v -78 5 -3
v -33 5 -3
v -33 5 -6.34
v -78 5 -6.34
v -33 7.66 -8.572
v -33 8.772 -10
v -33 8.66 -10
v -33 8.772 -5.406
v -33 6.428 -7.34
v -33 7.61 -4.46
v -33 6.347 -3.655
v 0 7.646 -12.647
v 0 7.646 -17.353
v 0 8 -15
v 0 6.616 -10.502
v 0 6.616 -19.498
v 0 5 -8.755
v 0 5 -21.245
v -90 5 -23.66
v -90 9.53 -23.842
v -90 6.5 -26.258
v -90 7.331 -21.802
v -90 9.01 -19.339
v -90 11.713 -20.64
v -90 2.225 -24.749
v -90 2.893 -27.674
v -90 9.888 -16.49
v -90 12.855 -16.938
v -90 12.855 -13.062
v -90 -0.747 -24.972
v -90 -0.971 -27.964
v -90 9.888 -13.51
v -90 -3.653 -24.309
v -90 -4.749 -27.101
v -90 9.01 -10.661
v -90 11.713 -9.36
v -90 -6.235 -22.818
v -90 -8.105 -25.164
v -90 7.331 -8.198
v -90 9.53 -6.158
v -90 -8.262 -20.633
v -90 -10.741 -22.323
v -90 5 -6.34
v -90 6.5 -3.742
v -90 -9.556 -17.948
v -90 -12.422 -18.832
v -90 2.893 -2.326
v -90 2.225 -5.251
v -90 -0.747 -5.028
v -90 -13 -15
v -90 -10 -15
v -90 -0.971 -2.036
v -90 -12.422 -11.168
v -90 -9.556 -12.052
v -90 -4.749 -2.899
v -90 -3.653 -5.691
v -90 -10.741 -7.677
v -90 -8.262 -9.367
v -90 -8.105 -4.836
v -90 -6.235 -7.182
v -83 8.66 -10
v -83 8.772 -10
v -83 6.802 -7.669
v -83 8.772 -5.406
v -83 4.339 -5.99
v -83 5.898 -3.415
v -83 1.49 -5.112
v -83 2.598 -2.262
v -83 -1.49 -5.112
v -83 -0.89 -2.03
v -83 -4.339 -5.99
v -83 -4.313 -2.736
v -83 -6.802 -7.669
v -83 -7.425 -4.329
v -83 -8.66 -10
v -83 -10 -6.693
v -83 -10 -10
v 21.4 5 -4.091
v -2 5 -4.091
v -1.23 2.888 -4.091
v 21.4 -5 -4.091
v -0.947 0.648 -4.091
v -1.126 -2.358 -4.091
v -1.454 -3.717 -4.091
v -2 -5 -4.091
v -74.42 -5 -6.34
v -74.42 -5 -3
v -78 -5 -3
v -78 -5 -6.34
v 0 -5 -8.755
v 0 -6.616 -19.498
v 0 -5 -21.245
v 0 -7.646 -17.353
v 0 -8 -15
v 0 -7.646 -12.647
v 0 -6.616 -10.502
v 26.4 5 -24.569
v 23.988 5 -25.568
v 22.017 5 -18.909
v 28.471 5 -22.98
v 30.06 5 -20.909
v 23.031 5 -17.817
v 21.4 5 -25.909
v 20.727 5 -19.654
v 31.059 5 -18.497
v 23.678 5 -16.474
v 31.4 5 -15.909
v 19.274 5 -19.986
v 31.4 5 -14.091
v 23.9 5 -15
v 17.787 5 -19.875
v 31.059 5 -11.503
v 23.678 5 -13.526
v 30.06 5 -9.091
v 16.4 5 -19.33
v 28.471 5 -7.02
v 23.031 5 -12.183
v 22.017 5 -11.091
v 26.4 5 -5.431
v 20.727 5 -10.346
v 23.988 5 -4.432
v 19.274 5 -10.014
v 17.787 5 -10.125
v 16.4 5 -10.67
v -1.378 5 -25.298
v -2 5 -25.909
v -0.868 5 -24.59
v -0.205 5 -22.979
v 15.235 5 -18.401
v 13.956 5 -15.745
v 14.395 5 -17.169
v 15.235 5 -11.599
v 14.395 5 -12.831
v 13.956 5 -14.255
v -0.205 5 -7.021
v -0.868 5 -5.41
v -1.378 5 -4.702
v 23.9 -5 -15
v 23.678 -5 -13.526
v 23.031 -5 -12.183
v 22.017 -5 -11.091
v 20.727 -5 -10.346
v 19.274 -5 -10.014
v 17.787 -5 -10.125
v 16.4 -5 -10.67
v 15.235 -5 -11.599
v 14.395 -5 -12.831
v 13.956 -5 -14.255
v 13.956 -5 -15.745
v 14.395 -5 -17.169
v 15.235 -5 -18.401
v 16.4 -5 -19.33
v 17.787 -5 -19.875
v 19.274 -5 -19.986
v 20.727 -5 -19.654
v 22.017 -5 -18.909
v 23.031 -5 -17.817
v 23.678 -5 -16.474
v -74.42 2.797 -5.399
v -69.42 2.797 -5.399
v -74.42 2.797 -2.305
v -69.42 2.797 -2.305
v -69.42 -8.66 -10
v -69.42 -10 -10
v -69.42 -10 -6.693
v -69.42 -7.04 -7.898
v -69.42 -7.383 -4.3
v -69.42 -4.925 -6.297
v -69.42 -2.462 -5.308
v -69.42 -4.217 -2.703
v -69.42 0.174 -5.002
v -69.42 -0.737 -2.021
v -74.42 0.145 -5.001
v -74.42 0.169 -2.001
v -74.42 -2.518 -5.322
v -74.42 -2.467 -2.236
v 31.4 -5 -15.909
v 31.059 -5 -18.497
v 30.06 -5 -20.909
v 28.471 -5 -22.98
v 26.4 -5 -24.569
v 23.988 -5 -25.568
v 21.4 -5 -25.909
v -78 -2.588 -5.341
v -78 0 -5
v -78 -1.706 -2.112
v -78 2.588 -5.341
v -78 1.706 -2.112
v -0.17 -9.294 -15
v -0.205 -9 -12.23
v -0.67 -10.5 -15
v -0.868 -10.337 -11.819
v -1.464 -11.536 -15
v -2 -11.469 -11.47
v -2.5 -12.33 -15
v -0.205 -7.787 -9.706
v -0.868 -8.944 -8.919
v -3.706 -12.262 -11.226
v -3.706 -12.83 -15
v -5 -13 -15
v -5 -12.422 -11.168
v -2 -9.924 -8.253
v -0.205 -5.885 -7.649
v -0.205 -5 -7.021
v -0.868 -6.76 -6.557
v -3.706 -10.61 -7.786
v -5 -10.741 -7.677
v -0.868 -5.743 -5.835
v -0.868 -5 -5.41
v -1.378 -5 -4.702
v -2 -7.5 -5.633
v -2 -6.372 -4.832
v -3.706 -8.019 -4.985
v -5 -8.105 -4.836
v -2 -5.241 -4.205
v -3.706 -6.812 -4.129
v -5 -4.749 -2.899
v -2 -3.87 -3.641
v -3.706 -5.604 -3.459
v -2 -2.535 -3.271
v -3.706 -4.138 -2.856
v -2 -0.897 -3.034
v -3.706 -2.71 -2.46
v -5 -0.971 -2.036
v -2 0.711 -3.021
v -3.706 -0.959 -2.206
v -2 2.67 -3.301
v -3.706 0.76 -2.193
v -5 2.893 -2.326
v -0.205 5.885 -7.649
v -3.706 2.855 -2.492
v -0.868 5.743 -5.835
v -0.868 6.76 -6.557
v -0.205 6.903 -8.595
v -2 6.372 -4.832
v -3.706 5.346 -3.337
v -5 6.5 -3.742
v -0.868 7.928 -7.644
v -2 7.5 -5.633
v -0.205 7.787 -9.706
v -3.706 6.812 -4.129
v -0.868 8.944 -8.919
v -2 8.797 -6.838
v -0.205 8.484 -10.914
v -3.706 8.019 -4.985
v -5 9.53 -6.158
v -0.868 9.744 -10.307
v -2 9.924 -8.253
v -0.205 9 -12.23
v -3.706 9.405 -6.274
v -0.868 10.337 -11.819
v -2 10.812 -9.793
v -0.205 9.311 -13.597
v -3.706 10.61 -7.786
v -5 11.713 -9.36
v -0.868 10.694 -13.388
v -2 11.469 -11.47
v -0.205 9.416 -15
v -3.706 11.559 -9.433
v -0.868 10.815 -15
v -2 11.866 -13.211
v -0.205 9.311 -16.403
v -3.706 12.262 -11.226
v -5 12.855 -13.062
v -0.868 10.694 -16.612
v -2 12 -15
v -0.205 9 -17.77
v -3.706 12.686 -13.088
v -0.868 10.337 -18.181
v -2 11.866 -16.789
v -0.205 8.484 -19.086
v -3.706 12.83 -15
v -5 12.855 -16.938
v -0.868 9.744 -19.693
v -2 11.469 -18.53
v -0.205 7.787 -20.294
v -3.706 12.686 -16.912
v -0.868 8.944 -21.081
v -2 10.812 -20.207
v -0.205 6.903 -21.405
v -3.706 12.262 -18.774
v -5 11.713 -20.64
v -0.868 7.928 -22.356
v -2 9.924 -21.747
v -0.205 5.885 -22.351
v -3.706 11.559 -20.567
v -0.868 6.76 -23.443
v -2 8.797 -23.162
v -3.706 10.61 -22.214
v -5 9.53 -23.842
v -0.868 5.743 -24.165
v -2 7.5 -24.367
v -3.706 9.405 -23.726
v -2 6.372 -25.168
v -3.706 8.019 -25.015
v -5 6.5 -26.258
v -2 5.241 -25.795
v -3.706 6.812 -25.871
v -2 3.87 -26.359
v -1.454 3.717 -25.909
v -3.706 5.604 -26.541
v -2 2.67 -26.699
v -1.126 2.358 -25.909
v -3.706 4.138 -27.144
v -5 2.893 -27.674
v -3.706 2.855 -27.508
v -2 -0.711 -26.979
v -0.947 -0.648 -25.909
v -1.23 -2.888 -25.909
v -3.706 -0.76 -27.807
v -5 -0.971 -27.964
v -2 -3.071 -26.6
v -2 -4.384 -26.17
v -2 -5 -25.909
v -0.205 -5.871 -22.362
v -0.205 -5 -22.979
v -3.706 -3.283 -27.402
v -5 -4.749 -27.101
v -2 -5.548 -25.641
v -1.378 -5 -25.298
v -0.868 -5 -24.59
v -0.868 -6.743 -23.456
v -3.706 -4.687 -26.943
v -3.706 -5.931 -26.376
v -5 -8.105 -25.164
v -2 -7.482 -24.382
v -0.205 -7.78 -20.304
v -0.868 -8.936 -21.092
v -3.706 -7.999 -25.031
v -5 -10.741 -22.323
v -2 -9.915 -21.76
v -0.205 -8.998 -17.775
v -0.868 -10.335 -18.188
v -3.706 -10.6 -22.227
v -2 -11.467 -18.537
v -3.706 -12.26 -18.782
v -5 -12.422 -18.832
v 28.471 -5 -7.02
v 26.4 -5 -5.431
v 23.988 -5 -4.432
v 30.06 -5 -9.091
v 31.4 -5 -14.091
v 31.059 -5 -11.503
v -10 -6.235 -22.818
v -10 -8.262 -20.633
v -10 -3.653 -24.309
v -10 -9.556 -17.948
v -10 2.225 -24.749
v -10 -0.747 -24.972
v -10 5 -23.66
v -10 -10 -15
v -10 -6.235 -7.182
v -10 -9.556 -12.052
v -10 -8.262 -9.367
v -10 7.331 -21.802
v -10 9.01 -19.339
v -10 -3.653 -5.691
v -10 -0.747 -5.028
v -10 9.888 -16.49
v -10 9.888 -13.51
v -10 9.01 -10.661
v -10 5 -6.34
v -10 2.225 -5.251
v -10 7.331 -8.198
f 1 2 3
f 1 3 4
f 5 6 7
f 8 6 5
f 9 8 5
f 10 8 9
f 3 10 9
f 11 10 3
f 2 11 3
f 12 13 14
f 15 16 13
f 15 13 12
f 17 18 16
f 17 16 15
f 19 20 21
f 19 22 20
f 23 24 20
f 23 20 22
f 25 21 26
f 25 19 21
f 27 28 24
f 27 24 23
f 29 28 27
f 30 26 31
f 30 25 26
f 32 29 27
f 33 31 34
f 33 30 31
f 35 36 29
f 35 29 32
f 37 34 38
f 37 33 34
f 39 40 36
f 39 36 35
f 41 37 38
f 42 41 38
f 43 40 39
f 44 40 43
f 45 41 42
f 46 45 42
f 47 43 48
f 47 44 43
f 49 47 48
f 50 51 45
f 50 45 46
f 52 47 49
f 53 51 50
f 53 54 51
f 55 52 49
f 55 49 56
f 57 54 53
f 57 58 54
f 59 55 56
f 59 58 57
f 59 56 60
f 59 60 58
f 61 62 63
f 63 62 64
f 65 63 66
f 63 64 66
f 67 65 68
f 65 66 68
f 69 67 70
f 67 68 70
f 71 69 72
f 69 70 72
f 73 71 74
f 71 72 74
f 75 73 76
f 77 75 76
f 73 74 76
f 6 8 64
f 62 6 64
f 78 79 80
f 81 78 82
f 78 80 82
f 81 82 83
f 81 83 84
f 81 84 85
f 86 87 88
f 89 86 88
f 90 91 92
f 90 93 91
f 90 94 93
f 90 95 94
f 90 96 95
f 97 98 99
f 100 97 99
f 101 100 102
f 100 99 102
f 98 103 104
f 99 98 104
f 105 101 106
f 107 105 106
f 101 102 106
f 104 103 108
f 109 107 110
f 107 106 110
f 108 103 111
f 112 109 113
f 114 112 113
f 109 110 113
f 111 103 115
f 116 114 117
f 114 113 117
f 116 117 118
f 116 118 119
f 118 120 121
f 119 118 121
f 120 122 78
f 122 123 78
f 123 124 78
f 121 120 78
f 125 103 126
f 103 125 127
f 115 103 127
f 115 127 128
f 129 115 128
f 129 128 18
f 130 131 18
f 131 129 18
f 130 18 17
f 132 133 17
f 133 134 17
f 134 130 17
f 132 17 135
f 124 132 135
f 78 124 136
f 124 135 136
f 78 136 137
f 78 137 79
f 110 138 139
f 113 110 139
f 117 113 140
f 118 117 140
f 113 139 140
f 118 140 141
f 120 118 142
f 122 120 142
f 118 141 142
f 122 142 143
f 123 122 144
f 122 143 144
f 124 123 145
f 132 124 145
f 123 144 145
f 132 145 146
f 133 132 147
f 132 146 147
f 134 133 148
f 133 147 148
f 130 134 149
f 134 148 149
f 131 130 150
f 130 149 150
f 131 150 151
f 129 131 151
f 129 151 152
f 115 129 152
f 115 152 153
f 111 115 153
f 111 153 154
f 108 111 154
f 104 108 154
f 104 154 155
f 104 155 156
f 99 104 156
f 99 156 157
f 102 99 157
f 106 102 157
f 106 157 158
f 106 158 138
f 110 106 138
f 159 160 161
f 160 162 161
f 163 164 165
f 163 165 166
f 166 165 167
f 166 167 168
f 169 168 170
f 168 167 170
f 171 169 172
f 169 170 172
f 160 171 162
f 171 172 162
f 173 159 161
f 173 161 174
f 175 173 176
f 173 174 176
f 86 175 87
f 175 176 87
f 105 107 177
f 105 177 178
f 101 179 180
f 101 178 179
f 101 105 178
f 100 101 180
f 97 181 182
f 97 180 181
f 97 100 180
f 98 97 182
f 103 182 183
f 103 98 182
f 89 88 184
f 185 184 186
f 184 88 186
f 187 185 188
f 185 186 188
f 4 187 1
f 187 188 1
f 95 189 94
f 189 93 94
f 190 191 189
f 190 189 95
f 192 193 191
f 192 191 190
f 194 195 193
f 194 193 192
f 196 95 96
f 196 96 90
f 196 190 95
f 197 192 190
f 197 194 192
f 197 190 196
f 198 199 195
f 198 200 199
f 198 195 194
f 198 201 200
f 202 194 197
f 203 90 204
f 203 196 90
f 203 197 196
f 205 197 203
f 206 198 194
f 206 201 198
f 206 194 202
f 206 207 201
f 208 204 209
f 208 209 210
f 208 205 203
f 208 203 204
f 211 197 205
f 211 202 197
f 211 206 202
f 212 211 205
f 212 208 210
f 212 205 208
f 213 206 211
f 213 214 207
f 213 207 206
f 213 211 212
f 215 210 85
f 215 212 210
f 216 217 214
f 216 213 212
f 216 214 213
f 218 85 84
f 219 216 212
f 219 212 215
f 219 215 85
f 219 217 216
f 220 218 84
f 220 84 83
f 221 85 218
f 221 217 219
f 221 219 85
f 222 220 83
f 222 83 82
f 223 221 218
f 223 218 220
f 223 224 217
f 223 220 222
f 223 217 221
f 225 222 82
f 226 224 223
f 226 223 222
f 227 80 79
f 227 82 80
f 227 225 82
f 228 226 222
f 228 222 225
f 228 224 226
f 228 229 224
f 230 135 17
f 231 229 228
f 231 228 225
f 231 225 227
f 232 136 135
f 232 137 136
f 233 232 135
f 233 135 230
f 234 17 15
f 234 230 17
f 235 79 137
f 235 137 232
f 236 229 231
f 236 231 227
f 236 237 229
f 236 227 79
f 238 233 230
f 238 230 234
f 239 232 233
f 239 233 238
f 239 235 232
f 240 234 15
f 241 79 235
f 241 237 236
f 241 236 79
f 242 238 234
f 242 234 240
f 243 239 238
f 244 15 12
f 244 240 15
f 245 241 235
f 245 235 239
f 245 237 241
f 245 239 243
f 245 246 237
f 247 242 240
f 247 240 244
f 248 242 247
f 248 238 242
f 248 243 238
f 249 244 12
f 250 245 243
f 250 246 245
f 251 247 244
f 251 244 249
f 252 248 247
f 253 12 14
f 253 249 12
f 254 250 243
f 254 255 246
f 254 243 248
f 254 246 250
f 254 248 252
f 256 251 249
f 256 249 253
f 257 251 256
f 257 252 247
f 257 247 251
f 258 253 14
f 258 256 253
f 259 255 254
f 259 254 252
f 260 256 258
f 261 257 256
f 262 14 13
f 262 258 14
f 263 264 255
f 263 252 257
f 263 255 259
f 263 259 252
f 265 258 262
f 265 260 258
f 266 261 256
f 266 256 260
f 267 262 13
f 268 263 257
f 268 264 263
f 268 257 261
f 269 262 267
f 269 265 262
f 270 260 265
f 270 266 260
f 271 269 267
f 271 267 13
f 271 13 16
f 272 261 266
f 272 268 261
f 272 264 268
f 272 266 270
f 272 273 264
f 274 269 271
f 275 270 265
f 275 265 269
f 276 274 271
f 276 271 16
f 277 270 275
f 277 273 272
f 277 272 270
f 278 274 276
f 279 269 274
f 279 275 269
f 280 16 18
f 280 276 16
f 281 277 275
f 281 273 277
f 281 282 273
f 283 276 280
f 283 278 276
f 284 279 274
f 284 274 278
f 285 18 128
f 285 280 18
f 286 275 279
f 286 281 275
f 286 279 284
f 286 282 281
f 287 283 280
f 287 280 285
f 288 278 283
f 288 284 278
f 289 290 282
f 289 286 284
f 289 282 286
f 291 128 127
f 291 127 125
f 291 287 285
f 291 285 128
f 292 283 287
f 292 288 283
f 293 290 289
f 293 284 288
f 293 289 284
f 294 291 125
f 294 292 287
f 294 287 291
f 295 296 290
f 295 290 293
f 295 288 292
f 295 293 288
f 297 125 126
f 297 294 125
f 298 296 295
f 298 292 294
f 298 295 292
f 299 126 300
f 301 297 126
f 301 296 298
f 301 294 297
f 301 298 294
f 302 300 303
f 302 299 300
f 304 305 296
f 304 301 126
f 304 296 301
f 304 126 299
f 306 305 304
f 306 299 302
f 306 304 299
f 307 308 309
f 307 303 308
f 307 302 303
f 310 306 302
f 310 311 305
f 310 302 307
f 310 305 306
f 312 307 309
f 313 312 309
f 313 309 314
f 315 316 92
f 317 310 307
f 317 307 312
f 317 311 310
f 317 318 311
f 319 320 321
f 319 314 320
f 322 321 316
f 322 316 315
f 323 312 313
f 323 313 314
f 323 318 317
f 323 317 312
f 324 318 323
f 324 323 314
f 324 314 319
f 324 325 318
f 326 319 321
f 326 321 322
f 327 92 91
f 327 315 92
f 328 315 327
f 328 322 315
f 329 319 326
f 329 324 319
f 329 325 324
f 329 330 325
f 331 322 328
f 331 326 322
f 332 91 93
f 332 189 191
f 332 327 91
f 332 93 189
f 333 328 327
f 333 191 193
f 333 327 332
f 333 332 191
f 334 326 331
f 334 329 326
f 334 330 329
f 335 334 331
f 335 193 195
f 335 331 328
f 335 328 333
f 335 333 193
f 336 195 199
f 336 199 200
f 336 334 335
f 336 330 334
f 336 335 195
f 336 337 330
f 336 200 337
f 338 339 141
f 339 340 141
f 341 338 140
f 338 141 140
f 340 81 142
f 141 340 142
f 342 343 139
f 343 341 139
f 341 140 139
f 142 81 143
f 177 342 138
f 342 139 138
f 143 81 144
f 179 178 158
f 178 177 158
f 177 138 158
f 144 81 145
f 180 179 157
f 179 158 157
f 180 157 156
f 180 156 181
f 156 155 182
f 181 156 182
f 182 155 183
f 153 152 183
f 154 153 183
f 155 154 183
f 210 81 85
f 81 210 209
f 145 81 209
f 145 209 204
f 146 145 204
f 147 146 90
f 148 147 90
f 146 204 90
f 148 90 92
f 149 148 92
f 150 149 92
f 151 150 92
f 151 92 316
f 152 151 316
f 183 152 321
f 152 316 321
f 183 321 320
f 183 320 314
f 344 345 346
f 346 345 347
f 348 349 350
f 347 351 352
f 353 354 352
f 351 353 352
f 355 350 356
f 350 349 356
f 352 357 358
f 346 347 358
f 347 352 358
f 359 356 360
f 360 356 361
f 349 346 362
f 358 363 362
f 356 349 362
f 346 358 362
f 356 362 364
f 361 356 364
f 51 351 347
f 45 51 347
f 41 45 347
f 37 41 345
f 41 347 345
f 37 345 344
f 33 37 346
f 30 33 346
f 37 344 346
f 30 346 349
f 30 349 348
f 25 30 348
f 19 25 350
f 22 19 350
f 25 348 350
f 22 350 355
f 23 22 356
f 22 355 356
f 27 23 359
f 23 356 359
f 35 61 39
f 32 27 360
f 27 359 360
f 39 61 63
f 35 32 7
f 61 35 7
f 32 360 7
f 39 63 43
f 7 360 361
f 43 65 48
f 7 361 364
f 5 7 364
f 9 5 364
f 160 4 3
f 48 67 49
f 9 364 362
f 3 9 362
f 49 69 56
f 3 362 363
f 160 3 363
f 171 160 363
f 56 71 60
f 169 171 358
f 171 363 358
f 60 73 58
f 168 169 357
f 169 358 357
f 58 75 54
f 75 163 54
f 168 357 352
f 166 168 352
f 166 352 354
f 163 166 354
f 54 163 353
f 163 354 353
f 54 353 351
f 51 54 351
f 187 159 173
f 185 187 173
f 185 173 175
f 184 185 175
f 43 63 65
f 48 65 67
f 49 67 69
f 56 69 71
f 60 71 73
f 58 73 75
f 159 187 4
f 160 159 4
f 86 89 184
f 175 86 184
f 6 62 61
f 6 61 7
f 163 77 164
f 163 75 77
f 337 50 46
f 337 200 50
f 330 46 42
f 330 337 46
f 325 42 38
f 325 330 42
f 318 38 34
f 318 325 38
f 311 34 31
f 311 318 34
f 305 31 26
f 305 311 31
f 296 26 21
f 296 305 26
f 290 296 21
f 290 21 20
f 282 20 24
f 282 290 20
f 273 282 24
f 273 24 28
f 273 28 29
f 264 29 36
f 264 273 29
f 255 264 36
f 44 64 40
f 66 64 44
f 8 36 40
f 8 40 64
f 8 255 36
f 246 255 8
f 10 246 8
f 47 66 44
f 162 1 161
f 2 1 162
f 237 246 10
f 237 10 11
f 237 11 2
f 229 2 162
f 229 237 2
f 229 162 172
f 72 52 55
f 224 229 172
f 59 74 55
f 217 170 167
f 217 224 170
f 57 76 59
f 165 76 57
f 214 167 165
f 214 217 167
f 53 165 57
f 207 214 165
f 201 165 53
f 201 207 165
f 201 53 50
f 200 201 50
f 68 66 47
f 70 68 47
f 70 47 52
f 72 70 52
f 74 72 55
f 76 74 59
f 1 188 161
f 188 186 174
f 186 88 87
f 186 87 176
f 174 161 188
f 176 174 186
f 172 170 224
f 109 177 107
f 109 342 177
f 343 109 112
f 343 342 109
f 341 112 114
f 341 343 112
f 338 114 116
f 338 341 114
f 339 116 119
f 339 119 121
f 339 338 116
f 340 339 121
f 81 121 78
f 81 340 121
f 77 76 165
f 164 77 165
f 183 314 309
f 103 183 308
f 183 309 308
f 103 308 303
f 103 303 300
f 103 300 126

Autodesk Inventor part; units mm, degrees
ref_plane "YZ Plane" through (0, 0, 0) normal (1, 0, 0) x (0, 1, 0)
sketch "Schizzo1" plane through (0, 0, 0) normal (0, 1, 0) x (-1, 0, 0)
  line L0 (0, 0) -> (0, -30)
  line L1 (0, -15) -> (90, -15)
  line L2 (100, 0) -> (100, -30)
  line L3 (0, -30) -> (100, -30)
  line L4 (100, 0) -> (0, 0)
  line L5 (100, -41.4573) -> (75, -41.4573)
  line L6 (75, -17) -> (85, -17)
  line L7 (75, -17) -> (75, -22)
  line L8 (85, -17) -> (85, -29.5)
  line L9 (75, -22) -> (80, -22)
  line L10 (80, -22) -> (80, -24.5)
  line L11 (80, -24.5) -> (5, -24.5)
  line L12 (85, -29.5) -> (5, -29.5)
  line L13 (5, -24.5) -> (5, -29.5)
  dimension "d0" = 30
  dimension "d1" = 90
  dimension "d5" = 25
  dimension "d6" = 17
  dimension "d7" = 10
  dimension "d8" = 5
  dimension "d9" = 12.5
  dimension "d10" = 5
  dimension "d11" = 2.5
  dimension "d13" = 80
  dimension "d16" = 75
  dimension "d76" = 100
sketch "Schizzo2" plane through (0, 0, 0) normal (1, 0, 0) x (0, 1, 0)
  circle A0 centre (0, -15) radius 13
  circle A1 centre (0, -15) radius 12
  line L0 (5, -4.0913) -> (-5, -4.0913)
  line L1 (-5, -4.0913) -> (-5, -25.9087)
  line L2 (-5, -25.9087) -> (5, -25.9087)
  line L3 (5, -25.9087) -> (5, -4.0913)
  point P0 (0, 0)
  dimension "d2" = 15
  dimension "d3" = 26
  dimension "d53" = 24
  dimension "d58" = 10
  dimension "d59" = 21.8174
ref_plane "Piano di lavoro1" through (-90, 0, -15) normal (-1, 0, 0) x (0, -1, 0)
sketch "Schizzo3" plane through (-90, 0, -15) normal (-1, 0, 0) x (0, -1, 0)
  circle A0 centre (0, 0) radius 13
  point P0 (0, 15)
  dimension "d4" = 26
loft "Loft1" add profiles "Schizzo3", "Schizzo2" contours all / A0 | A1 L3 | L0 A1 | L3 L2 L1 L0 | A1 L2 | L1 A1
shell "Svuotamento1" thickness 3 removed faces 2 at (0, 3.4665, -13.963) at (-90, -3.4665, -13.963)
ref_plane "Piano di lavoro3" through (0, 0, -30) normal (0, 0.4988877, -0.8666667) x (-1, 0, 0)
sketch "Schizzo11" plane through (0, 0, -30) normal (0, 0.4988877, -0.8666667) x (-1, 0, 0)
  point P0 (0, 14.9666)
extrude "Estrusione5" add sketch "Schizzo2" against normal blind 10 contours A1 L3 | L0 A1 | L3 L2 L1 L0 | A1 L2 | L1 A1
extrude "Estrusione6" add sketch "Schizzo2" along normal blind 31.4 contours L3 L2 L1 L0
fillet "Raccordo1" radius 10 1 edges at (31.4, 0, -25.9087)
fillet "Raccordo2" radius 10 1 edges at (31.4, 0, -4.0913)
sketch "Schizzo12" plane through (0, -5, -25.9087) normal (0, -1, 0) x (1, 0, 0)
  line L0 (0, 0) -> (21.4, 0) projected
  line L1 (6.4, 21.8172) -> (21.4, 21.8172)
  line L2 (31.4, 11.8174) -> (31.4, 10) projected
  circle A0 centre (18.9, 10.9087) radius 5
  line L3 (0, 25.9087) -> (0, -2.0913) projected
  point P0 (13.9, 21.8172)
  point P1 (31.4, 10.9087)
  point P2 (10.7, 0)
  point P3 (31.4, 10.9087)
  point P4 (0, -2.0913)
  dimension "d64" = 21.8172
  dimension "d70" = 10
  dimension "d71" = 12.5
  dimension "d72" = 10.9085
  dimension "d75" = 18.9
extrude "Estrusione7" cut sketch "Schizzo12" against normal blind 25
fillet "Raccordo3" radius 5 1 edges at (0, 13, -15)
sketch "Schizzo13" plane through (0, 0, 0) normal (0, 0, 1) x (1, 0, 0)
  line L0 (-33, 8.7721) -> (-83, 8.7721)
  line L1 (-90, 10) -> (-10, 10) projected
  line L2 (-33, 8.7721) -> (-33, 5)
  line L3 (-5, -13) -> (-5, 13) projected
  line L4 (-83, 8.7721) -> (-83, -10)
  line L5 (-83, -10) -> (-69.4203, -10)
  line L6 (-90, -10) -> (-10, -10) projected
  line L7 (-69.4203, -10) -> (-69.4203, 2.7972)
  line L8 (-69.4203, 2.7972) -> (-74.4203, 2.7972)
  line L9 (-74.4203, 2.7972) -> (-74.4203, -5)
  line L10 (-74.4203, -5) -> (-78, -5)
  line L11 (-78, -5) -> (-78, 5)
  line L12 (-33, 5) -> (-78, 5)
  point P0 (0, 0)
  point P1 (-33, 6.8861)
  dimension "d21" = 3
  dimension "d79" = 28
  dimension "d80" = 50
  dimension "d83" = 5
  dimension "d84" = 5
  dimension "d85" = 7.7972
  dimension "d86" = 5
  dimension "d87" = 5
extrude "Estrusione8" cut sketch "Schizzo13" against normal blind 10
properties part number "asteoscila1_(306)"
